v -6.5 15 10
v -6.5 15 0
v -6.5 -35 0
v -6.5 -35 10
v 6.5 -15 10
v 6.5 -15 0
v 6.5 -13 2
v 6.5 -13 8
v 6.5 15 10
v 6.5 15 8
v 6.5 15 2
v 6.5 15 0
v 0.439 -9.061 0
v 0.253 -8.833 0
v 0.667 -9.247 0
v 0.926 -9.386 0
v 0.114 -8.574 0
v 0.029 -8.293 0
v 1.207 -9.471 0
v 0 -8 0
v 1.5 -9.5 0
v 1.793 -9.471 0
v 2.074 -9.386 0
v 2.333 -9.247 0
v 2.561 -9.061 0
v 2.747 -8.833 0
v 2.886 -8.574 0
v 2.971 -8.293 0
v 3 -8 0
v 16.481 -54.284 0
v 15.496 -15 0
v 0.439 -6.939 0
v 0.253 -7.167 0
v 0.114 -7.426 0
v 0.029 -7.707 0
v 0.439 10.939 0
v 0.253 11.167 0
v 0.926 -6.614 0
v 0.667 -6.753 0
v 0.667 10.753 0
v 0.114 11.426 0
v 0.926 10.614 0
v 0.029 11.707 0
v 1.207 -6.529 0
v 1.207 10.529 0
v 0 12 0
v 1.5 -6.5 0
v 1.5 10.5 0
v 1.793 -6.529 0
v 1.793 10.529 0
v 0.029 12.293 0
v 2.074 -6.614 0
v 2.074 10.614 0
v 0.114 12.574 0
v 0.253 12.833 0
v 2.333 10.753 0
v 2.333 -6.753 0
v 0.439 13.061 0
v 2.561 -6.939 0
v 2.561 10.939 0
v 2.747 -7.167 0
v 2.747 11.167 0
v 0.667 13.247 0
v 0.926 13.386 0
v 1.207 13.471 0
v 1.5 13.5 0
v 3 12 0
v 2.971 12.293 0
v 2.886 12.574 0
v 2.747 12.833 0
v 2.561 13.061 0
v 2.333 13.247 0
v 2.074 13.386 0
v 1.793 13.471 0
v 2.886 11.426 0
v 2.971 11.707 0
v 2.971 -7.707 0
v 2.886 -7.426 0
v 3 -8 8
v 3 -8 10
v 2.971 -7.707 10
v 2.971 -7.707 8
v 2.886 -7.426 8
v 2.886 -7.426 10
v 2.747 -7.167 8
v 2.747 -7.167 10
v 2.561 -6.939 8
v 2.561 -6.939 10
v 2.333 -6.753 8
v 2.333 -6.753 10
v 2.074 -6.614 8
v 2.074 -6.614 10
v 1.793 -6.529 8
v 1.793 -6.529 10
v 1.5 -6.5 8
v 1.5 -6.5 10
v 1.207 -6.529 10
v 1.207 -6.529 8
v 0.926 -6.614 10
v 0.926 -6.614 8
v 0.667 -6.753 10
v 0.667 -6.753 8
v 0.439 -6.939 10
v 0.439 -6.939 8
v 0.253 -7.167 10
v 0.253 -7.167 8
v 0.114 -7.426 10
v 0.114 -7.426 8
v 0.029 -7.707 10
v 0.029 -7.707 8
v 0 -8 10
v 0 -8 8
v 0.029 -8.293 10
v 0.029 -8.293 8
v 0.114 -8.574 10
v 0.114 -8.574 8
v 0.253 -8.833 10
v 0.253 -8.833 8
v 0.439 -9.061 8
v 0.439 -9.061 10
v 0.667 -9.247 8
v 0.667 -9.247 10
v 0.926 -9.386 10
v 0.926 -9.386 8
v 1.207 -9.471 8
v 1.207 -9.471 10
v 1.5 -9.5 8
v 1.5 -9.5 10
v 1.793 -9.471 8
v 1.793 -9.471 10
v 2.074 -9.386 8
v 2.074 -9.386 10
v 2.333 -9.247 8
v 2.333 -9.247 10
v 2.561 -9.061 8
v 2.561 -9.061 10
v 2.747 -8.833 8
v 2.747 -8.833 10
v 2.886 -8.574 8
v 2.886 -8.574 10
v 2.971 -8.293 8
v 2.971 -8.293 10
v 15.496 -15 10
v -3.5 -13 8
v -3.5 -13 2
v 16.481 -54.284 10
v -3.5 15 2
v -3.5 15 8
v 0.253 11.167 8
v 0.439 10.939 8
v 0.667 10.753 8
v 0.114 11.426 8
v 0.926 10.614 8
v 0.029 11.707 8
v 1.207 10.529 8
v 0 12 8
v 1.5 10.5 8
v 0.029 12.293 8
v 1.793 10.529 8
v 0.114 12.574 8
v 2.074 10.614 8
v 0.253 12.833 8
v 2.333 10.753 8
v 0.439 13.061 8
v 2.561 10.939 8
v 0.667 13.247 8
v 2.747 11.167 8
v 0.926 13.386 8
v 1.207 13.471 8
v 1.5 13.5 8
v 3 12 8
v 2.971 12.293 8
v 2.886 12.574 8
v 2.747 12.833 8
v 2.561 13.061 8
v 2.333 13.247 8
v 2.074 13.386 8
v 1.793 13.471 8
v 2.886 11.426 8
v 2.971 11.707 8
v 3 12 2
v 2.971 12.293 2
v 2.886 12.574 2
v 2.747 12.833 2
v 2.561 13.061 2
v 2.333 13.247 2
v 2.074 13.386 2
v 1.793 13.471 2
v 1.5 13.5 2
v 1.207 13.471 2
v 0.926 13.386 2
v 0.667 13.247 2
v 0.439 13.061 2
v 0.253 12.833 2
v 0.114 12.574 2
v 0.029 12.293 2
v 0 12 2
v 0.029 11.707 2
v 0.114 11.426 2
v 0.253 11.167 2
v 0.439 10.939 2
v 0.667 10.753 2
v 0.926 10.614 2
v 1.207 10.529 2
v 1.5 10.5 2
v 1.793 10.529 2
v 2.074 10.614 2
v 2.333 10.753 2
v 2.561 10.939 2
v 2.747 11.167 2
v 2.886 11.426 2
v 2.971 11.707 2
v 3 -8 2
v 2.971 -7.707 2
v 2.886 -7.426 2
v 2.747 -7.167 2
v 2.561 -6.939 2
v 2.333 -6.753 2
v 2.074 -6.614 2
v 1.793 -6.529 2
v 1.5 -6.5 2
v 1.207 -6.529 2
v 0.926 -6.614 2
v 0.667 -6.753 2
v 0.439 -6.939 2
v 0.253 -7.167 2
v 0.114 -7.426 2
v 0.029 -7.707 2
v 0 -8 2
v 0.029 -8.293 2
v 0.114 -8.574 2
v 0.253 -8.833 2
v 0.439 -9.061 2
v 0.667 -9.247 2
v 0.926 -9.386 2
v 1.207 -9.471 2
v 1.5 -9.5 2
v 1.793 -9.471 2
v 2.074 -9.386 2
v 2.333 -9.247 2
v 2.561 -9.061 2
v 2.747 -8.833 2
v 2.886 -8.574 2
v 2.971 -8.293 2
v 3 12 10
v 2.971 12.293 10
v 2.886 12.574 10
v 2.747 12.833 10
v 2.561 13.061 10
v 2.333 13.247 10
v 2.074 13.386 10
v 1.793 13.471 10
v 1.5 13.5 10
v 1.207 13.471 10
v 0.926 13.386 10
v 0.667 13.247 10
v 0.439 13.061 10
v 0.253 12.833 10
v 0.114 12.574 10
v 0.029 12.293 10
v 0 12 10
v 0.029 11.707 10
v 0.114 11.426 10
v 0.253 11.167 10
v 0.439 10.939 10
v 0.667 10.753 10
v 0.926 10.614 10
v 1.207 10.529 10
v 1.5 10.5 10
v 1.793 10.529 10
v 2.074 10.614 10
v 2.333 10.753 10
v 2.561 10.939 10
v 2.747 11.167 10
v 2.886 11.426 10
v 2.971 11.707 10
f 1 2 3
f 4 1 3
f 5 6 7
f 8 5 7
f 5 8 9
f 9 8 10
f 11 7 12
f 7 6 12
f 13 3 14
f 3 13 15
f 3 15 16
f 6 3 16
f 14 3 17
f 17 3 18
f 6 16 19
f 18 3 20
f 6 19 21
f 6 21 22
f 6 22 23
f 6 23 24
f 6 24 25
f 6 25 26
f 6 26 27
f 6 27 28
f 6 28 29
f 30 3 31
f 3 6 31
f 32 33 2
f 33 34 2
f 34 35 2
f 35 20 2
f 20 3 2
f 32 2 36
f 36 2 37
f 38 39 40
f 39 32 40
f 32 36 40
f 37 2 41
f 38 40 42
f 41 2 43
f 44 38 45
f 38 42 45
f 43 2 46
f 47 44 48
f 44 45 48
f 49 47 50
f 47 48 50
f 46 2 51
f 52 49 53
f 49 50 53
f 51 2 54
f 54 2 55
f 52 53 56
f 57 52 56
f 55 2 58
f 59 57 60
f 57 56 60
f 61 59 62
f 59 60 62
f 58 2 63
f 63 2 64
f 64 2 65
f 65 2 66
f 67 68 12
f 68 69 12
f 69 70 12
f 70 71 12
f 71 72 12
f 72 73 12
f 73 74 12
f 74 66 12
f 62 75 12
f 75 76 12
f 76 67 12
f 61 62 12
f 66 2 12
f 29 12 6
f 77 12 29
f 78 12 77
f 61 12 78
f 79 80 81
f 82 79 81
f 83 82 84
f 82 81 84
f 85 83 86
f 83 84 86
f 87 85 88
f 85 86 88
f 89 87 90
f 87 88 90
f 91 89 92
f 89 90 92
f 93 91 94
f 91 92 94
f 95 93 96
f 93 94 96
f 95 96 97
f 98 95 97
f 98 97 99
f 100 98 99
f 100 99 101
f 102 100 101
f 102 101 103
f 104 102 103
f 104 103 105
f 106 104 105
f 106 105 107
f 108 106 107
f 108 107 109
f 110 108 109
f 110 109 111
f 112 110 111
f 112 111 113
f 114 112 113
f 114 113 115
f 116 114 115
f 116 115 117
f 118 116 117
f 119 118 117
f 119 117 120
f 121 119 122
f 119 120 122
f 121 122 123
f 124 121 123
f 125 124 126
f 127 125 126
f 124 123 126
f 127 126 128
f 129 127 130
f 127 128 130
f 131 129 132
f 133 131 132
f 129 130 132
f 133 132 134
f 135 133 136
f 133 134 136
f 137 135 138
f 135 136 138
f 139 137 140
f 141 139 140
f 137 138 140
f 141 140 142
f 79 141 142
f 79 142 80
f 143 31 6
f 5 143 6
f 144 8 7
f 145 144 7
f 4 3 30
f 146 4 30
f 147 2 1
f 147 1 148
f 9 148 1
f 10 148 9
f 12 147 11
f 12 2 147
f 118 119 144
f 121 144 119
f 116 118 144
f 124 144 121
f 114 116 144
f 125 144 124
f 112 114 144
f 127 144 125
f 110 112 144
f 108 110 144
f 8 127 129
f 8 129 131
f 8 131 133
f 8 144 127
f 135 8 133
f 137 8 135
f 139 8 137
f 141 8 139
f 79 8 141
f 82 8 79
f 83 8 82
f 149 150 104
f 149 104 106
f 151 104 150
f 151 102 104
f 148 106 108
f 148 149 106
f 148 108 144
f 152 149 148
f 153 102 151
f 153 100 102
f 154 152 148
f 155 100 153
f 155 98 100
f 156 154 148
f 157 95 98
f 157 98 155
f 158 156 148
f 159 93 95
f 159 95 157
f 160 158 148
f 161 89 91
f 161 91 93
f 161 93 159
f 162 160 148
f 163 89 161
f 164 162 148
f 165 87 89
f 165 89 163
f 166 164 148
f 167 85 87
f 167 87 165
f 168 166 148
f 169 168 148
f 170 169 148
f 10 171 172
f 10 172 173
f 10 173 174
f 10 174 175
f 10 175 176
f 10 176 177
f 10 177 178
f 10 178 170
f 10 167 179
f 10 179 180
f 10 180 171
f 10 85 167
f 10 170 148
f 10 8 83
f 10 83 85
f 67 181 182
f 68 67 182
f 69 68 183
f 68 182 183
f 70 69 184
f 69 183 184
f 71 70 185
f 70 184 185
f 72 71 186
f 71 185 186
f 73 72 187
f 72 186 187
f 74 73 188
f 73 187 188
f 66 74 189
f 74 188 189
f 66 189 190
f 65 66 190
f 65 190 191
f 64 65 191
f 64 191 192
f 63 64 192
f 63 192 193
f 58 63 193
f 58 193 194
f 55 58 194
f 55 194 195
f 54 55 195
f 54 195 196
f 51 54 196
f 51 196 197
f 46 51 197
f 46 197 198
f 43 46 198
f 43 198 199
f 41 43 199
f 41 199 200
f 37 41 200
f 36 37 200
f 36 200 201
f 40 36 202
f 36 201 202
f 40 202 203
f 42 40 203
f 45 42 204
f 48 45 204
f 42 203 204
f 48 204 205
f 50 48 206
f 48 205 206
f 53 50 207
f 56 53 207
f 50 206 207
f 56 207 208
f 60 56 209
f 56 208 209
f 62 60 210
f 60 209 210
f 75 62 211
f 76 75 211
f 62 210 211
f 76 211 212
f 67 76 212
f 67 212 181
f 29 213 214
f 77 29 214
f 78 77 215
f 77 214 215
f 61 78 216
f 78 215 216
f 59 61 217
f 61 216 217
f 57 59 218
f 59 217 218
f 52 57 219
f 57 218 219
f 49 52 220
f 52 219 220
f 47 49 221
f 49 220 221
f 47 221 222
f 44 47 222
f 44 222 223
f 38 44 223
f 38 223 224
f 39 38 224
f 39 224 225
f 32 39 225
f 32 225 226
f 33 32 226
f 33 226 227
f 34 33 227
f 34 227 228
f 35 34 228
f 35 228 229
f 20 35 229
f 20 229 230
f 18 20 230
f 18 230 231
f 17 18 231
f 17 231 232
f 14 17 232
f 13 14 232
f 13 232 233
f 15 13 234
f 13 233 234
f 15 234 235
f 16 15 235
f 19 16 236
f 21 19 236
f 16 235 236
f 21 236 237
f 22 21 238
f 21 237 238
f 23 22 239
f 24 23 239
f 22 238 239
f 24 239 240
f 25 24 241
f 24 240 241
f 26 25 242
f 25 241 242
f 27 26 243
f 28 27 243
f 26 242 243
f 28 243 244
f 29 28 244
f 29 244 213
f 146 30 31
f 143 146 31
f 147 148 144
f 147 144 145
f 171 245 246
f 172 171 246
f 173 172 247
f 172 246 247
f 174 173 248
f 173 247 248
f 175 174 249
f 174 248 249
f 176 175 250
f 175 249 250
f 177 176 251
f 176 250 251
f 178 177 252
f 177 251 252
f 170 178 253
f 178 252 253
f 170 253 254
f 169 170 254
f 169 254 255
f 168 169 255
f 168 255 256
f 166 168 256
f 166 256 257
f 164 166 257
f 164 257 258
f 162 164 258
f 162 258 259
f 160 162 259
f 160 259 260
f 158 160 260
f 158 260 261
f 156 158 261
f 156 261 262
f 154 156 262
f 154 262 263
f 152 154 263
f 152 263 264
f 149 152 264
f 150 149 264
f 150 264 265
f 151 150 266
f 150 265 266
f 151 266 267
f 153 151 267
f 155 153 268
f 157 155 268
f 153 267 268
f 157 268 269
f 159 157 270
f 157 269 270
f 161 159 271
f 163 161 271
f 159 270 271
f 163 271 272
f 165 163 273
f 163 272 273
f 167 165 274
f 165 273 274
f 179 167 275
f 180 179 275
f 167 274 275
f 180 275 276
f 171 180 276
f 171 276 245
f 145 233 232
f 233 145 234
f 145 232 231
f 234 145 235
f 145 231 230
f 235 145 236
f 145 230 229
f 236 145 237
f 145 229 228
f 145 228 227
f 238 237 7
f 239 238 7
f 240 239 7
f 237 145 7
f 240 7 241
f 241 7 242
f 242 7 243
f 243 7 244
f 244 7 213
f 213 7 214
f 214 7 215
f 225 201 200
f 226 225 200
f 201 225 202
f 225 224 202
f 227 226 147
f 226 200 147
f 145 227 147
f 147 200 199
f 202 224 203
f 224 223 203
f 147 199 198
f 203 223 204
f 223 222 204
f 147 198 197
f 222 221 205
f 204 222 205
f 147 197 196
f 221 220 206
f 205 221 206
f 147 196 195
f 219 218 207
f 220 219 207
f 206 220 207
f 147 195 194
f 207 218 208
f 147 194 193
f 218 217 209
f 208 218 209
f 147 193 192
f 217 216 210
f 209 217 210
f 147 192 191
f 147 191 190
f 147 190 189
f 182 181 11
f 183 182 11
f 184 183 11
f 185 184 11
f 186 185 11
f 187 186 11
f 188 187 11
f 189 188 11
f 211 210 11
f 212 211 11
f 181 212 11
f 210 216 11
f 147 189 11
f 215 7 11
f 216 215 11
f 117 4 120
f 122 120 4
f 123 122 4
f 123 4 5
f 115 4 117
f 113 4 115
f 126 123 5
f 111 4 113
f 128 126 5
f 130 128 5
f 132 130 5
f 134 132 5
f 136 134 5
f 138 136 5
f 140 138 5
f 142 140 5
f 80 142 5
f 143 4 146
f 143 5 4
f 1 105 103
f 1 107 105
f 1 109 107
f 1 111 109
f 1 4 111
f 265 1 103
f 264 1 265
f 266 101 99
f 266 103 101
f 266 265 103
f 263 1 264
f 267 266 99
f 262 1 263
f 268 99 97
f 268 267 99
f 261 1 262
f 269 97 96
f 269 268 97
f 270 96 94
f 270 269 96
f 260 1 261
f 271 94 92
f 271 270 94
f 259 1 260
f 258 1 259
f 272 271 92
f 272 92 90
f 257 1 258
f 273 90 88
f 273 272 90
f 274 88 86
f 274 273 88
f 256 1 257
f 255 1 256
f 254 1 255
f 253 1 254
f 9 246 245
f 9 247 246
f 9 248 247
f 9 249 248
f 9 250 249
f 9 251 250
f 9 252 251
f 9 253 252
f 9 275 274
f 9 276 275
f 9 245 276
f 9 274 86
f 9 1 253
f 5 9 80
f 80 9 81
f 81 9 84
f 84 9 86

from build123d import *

# Parameters (mm, degrees)
SKETCH_1_W          = 13
SKETCH_1_H          = 30
EXTRUDE_1_DEPTH     = 10
SKETCH_2_W          = 6
SKETCH_2_H          = 28
CUT_EXTRUDE_1_DEPTH = 10
SKETCH_3_R          = 1.5
CUT_EXTRUDE_2_DEPTH = 58.605092201
SKETCH_4_R          = 1.5
CUT_EXTRUDE_3_DEPTH = 58.605092201


with BuildPart() as part:
    # 草图1 → 凸台-拉伸1 (new body)
    with BuildSketch(Plane.XY):
        Rectangle(SKETCH_1_W, SKETCH_1_H)
        Polygon((16.481333294, -54.283628291), (15.495607284, -15), (6.5, -15), (-6.5, -15), (-6.5, -35), align=None)
    extrude(amount=EXTRUDE_1_DEPTH)

    # 草图2 → 切除-拉伸1 (cut)
    with BuildSketch(Plane(origin=(6.5, 0, 0), x_dir=(0, 0, -1), z_dir=(1, 0, 0))):
        with Locations((-5, 1)):
            Rectangle(SKETCH_2_W, SKETCH_2_H)
    extrude(amount=-CUT_EXTRUDE_1_DEPTH, mode=Mode.SUBTRACT)

    # 草图3 → 切除-拉伸2 (cut, through all)
    with BuildSketch(Plane.XY.offset(10)):
        with Locations((1.5, 12)):
            Circle(SKETCH_3_R)
    extrude(amount=-CUT_EXTRUDE_2_DEPTH, mode=Mode.SUBTRACT)

    # 草图4 → 切除-拉伸3 (cut, through all)
    with BuildSketch(Plane.XY.offset(10)):
        with Locations((1.5, -8)):
            Circle(SKETCH_4_R)
    extrude(amount=-CUT_EXTRUDE_3_DEPTH, mode=Mode.SUBTRACT)


solid = part.part
